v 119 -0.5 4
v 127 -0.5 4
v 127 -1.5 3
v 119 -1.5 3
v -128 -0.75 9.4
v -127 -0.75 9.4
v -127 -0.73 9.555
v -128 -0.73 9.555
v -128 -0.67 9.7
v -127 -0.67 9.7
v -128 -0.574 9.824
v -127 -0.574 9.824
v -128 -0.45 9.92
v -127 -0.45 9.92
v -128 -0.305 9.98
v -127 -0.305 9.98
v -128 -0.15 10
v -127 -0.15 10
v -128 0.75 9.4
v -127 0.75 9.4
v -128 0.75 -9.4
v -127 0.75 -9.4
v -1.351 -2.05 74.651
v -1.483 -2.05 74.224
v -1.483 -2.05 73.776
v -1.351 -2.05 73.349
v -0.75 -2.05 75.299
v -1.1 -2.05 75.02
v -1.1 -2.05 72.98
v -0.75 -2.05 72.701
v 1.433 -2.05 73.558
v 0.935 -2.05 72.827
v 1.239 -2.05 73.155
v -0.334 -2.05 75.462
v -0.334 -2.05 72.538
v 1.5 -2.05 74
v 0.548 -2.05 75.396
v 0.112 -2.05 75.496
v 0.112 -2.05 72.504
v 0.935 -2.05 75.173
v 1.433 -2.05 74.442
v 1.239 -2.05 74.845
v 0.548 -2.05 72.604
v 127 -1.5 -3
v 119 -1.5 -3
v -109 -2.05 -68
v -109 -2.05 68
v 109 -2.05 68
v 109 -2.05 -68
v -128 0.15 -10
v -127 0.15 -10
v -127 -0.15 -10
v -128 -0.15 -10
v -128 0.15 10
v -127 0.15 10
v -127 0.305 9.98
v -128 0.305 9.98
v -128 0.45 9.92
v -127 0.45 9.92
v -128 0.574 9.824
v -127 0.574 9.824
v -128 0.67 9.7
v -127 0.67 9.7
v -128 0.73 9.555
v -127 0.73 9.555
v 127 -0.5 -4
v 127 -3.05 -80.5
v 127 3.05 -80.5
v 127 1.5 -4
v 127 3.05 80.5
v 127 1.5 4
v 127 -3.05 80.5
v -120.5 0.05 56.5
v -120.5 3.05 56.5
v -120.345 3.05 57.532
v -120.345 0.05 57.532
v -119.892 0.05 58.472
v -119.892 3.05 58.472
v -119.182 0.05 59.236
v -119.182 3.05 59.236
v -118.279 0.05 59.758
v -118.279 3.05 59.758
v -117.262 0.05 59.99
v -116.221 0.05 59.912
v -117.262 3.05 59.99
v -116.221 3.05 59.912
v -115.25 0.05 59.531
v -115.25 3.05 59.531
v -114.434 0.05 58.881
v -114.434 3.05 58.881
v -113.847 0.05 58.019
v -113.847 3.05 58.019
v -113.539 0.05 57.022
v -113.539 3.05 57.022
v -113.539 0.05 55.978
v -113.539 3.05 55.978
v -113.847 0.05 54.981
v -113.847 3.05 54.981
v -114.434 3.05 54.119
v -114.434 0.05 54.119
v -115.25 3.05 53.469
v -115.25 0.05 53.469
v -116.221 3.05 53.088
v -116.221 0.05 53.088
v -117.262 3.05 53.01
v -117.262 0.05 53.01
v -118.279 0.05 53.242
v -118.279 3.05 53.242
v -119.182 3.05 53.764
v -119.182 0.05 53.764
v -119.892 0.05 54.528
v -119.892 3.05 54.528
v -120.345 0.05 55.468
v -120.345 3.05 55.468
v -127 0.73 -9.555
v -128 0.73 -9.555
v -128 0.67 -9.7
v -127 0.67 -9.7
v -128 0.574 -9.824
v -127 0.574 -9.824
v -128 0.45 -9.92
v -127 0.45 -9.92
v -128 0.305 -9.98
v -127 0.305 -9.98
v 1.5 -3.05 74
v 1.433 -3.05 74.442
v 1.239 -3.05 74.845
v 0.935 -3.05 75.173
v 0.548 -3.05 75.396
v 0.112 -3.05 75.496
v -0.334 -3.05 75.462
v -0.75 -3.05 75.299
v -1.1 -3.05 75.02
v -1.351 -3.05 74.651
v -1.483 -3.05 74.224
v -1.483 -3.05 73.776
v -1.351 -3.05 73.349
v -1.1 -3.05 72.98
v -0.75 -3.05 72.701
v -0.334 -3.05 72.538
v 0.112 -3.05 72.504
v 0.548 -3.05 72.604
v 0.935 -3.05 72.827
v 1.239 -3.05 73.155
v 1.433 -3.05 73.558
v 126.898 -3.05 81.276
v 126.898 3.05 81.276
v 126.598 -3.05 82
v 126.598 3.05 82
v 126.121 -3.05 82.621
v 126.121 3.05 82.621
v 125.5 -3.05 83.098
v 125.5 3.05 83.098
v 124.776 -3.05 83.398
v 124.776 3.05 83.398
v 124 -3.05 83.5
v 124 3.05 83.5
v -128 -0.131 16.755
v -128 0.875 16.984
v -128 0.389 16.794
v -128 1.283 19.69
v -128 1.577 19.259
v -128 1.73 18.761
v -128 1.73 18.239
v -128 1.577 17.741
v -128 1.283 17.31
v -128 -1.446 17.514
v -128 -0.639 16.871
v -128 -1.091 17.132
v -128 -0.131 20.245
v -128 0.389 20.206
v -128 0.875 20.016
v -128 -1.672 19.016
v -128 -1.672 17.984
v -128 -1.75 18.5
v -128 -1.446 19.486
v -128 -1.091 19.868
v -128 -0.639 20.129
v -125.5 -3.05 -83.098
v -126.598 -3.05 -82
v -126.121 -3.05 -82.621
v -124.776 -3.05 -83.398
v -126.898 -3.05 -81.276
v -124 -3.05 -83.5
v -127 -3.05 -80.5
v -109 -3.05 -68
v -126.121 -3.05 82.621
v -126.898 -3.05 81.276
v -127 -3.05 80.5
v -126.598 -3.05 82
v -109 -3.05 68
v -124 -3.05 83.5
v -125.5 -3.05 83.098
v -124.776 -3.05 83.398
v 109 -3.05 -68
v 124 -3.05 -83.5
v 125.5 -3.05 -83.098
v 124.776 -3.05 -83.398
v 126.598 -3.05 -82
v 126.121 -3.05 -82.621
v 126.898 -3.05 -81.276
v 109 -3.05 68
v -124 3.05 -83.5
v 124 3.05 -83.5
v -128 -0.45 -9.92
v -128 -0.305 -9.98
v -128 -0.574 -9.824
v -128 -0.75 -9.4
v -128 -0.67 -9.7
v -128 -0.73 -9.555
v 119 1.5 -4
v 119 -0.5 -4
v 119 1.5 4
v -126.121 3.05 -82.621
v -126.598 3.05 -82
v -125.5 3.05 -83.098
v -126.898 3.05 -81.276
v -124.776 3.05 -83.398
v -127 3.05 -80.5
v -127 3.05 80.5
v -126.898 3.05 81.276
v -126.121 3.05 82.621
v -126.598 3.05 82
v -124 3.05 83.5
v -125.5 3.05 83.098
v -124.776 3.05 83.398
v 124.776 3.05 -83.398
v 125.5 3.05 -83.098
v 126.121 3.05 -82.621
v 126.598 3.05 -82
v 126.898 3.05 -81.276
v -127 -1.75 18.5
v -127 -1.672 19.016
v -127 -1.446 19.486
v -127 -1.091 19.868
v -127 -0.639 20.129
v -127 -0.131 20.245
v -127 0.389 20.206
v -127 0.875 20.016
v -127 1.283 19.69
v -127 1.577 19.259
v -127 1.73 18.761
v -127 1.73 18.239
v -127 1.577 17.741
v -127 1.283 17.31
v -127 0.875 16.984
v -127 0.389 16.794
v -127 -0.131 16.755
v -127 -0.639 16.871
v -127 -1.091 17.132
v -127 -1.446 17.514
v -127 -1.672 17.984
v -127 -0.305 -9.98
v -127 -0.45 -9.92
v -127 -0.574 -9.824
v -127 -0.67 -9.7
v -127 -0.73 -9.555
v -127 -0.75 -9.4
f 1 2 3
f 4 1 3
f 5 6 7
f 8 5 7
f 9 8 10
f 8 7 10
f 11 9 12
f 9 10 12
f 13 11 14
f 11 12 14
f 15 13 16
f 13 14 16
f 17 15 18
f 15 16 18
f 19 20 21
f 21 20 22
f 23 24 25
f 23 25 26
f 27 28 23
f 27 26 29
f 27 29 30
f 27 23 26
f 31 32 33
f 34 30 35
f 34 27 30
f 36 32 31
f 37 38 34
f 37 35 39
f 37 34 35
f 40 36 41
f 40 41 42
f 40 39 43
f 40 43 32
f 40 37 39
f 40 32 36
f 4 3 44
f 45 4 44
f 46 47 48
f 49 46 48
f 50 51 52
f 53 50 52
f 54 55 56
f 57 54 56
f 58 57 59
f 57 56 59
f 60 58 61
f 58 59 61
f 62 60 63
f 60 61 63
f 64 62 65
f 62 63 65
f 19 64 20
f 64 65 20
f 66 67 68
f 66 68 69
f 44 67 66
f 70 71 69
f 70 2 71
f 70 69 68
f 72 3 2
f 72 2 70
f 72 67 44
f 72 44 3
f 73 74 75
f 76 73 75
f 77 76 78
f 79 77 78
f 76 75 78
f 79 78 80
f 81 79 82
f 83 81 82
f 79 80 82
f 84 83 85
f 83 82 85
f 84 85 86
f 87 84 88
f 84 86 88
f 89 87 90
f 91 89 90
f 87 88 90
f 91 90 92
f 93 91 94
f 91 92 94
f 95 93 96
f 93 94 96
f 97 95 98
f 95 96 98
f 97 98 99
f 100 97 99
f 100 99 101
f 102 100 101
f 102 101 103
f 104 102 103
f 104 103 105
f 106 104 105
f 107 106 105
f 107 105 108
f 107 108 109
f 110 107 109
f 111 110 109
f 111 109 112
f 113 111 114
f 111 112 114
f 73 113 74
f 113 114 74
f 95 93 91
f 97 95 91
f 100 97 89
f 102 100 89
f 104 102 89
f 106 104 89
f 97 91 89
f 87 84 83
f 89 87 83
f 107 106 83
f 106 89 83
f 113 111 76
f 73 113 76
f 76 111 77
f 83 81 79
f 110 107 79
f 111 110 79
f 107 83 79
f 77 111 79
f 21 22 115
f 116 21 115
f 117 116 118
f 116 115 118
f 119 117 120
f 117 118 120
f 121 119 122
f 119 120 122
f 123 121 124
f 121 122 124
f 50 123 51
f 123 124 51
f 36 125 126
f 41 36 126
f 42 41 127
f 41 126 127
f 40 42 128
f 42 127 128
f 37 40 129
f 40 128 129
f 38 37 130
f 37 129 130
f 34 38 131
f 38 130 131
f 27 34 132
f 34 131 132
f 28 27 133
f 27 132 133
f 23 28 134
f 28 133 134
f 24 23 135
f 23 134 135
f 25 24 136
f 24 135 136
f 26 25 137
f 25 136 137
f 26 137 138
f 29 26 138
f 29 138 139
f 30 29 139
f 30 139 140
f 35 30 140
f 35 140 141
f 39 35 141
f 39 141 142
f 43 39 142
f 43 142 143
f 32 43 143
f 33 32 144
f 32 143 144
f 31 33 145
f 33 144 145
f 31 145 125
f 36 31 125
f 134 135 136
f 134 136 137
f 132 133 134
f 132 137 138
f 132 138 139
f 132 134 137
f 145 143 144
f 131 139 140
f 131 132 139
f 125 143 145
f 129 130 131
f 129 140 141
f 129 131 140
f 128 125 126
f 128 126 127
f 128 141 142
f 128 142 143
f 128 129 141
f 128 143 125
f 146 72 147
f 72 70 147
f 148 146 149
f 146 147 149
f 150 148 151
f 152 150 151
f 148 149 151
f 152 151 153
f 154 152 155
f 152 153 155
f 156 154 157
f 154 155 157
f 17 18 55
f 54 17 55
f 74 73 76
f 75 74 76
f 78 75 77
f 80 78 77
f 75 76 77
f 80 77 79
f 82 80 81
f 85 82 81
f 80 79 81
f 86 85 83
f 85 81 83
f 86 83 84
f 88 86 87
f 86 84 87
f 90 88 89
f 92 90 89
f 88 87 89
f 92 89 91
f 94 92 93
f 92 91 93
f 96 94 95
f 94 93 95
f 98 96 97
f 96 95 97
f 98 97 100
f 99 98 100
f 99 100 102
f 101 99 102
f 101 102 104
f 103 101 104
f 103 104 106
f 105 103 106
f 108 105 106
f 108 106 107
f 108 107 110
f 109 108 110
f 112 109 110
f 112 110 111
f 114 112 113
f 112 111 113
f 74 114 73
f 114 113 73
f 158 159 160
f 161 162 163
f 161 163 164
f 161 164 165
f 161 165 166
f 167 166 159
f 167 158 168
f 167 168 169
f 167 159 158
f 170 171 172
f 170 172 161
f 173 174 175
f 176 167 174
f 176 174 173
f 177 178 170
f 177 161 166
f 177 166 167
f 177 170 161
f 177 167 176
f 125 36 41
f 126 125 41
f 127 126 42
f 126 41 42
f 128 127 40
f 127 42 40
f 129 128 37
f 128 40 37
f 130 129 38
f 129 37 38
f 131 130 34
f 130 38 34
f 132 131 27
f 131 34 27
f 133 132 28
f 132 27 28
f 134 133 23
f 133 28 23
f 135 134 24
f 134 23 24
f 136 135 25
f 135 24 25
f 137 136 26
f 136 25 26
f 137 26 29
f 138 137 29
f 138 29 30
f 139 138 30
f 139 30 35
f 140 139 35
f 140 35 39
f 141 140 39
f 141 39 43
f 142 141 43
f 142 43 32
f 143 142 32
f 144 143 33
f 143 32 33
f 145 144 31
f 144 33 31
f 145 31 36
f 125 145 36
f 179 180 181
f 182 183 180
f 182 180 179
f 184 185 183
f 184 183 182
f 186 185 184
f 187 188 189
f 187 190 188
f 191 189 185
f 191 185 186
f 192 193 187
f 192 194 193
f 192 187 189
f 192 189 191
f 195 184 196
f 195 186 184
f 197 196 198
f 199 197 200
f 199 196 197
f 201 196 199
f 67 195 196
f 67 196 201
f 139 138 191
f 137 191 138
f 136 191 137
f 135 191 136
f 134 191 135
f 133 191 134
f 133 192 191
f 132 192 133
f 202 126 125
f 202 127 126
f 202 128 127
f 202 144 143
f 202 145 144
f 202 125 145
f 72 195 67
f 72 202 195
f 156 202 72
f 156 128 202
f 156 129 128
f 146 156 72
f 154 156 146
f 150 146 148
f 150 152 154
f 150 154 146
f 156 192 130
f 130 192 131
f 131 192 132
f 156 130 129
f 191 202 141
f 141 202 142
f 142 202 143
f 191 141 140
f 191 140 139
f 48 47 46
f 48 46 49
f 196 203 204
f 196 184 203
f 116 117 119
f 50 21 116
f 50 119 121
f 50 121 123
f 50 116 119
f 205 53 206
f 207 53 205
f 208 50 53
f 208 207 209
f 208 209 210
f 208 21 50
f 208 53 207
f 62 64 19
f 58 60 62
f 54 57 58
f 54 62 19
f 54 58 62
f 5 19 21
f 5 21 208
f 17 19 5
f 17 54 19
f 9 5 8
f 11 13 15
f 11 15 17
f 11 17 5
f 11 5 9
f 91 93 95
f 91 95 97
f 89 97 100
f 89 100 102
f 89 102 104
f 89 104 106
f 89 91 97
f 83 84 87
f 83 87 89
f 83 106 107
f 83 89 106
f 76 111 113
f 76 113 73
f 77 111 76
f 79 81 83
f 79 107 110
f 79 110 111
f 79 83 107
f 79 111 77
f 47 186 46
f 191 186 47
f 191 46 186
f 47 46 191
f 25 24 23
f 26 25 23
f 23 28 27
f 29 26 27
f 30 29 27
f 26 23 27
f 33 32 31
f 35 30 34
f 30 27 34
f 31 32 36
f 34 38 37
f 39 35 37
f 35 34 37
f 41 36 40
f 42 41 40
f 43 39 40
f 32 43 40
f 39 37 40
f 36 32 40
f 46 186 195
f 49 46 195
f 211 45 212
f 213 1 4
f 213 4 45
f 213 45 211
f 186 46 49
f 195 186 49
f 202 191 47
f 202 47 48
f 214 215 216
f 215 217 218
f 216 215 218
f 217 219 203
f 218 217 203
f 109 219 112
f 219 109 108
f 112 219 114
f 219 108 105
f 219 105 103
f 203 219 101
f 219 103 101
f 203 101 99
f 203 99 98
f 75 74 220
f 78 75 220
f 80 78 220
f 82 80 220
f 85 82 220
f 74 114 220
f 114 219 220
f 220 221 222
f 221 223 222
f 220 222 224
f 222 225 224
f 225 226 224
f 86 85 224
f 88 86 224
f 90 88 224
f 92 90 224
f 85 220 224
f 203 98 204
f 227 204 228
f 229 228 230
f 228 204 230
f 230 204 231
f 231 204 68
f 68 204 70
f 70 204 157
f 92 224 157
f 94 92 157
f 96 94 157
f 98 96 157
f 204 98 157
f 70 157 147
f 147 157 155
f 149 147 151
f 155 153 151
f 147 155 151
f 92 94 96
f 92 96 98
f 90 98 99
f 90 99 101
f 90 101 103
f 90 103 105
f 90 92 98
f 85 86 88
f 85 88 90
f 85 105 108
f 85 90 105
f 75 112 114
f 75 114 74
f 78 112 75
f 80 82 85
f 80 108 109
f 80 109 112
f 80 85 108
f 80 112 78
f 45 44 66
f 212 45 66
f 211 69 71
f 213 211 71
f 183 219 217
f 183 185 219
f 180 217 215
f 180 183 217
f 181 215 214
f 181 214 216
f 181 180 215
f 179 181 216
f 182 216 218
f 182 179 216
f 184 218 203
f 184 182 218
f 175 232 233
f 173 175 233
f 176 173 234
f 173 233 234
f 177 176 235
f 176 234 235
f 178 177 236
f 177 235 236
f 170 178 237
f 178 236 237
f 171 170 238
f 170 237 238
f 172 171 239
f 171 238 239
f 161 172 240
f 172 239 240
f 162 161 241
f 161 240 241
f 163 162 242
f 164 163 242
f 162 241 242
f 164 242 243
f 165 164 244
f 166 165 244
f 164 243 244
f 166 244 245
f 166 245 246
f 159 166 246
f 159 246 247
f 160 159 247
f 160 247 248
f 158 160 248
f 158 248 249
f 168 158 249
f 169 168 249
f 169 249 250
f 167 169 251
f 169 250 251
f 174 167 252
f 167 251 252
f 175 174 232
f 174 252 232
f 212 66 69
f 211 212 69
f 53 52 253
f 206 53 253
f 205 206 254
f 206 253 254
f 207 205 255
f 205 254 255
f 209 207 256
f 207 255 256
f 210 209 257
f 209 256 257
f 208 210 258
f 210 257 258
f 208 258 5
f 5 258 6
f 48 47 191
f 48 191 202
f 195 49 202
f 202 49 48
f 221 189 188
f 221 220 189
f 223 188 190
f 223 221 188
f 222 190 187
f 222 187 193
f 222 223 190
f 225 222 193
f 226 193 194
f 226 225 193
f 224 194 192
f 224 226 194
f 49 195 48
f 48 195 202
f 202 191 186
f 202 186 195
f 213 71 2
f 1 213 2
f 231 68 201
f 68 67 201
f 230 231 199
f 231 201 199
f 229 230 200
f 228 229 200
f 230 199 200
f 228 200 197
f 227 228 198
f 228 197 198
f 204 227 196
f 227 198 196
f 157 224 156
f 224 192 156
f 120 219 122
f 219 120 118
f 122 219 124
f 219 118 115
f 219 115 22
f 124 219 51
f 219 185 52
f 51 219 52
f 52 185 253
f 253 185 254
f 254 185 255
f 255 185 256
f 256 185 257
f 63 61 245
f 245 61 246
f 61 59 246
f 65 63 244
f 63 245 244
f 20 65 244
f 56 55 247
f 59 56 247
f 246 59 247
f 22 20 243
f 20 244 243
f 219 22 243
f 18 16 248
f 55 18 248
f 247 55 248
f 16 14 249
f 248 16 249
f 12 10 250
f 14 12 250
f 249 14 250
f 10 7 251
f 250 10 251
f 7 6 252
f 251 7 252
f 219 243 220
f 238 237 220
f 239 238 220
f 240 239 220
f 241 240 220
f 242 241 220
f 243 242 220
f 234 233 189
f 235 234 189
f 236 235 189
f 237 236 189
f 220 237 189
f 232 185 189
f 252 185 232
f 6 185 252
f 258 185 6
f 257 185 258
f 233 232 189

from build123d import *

# Parameters (mm, degrees)
F0_W      = 254
F0_H      = 167
F1_DEPTH  = 3.05
F2_R      = 3
F3_W      = 218
F3_H      = 136
F3_R      = 1.5
F4_DEPTH  = 1
F5_W      = 218
F5_H      = 136
F6_DEPTH  = 1
F5_R      = 1.5
F7_R      = 3.5
F8_DEPTH  = 3
F9_R      = 3.5
F10_DEPTH = 3
F11_R     = 1.75
F12_DEPTH = 1
F14_DEPTH = 8


with BuildPart() as f1:
    # F0 (on Front) → F1 (new body, symmetric)
    with BuildSketch(Plane.XZ):
        Rectangle(F0_W, F0_H)
    extrude(amount=F1_DEPTH, both=True)

    # F2
    f2_edges = [f1.edges().sort_by_distance(p)[0] for p in [
        (127, 0, 83.5),
        (127, 0, -83.5),
        (-127, 0, -83.5),
        (-127, 0, 83.5),
    ]]
    fillet(f2_edges, radius=F2_R)

    # F3 (on face) → F4 (cut)
    with BuildSketch(Plane.XZ.offset(3.05)):
        Rectangle(F3_W, F3_H)
        with Locations((0, 74)):
            Circle(F3_R)
    extrude(amount=-F4_DEPTH, mode=Mode.SUBTRACT)

    # F7 (on face) → F8 (cut)
    with BuildSketch(Plane(origin=(0, 3.05, 0), x_dir=(-1, 0, 0), z_dir=(0, 1, 0))):
        with Locations((117, 56.5)):
            Circle(F7_R)
    extrude(amount=-F8_DEPTH, mode=Mode.SUBTRACT)

    # F11 (on face) → F12 (join)
    with BuildSketch(Plane(origin=(-127, 0, 0), x_dir=(0, -1, 0), z_dir=(-1, 0, 0))):
        with Locations((0, 18.5)):
            Circle(F11_R)
        with BuildLine():
            Line((0.15, 10), (-0.15, 10))
            ThreePointArc((-0.15, 10), (-0.5742640687, 9.8242640687), (-0.75, 9.4))
            Line((-0.75, 9.4), (-0.75, -9.4))
            ThreePointArc((-0.75, -9.4), (-0.5742640687, -9.8242640687), (-0.15, -10))
            Line((-0.15, -10), (0.15, -10))
            ThreePointArc((0.15, -10), (0.5742640687, -9.8242640687), (0.75, -9.4))
            Line((0.75, -9.4), (0.75, 9.4))
            ThreePointArc((0.75, 9.4), (0.5742640687, 9.8242640687), (0.15, 10))
        make_face()
    extrude(amount=F12_DEPTH)

    # F13 (on face) → F14 (cut)
    with BuildSketch(Plane.YZ.offset(127)):
        Polygon((1.5, -4), (1.5, 4), (-0.5, 4), (-1.5, 3), (-1.5, -3), (-0.5, -4), align=None)
    extrude(amount=-F14_DEPTH, mode=Mode.SUBTRACT)


with BuildPart() as f6:
    # F5 (on face) → F6 (new body, through all)
    with BuildSketch(Plane.XZ.offset(2.05)):
        Rectangle(F5_W, F5_H)
    extrude(amount=F6_DEPTH)


with BuildPart() as f6b:
    # F5 (on face) → F6, piece 2 (new body, through all)
    with BuildSketch(Plane.XZ.offset(2.05)):
        with Locations((0, 74)):
            Circle(F5_R)
    extrude(amount=F6_DEPTH)


with BuildPart() as f10:
    # F9 (on face) → F10 (new body)
    with BuildSketch(Plane(origin=(0, 0.05, 0), x_dir=(-1, 0, 0), z_dir=(0, 1, 0))):
        with Locations((117, 56.5)):
            Circle(F9_R)
    extrude(amount=F10_DEPTH)


solid = Compound([f1.part, f6.part, f6b.part, f10.part])
